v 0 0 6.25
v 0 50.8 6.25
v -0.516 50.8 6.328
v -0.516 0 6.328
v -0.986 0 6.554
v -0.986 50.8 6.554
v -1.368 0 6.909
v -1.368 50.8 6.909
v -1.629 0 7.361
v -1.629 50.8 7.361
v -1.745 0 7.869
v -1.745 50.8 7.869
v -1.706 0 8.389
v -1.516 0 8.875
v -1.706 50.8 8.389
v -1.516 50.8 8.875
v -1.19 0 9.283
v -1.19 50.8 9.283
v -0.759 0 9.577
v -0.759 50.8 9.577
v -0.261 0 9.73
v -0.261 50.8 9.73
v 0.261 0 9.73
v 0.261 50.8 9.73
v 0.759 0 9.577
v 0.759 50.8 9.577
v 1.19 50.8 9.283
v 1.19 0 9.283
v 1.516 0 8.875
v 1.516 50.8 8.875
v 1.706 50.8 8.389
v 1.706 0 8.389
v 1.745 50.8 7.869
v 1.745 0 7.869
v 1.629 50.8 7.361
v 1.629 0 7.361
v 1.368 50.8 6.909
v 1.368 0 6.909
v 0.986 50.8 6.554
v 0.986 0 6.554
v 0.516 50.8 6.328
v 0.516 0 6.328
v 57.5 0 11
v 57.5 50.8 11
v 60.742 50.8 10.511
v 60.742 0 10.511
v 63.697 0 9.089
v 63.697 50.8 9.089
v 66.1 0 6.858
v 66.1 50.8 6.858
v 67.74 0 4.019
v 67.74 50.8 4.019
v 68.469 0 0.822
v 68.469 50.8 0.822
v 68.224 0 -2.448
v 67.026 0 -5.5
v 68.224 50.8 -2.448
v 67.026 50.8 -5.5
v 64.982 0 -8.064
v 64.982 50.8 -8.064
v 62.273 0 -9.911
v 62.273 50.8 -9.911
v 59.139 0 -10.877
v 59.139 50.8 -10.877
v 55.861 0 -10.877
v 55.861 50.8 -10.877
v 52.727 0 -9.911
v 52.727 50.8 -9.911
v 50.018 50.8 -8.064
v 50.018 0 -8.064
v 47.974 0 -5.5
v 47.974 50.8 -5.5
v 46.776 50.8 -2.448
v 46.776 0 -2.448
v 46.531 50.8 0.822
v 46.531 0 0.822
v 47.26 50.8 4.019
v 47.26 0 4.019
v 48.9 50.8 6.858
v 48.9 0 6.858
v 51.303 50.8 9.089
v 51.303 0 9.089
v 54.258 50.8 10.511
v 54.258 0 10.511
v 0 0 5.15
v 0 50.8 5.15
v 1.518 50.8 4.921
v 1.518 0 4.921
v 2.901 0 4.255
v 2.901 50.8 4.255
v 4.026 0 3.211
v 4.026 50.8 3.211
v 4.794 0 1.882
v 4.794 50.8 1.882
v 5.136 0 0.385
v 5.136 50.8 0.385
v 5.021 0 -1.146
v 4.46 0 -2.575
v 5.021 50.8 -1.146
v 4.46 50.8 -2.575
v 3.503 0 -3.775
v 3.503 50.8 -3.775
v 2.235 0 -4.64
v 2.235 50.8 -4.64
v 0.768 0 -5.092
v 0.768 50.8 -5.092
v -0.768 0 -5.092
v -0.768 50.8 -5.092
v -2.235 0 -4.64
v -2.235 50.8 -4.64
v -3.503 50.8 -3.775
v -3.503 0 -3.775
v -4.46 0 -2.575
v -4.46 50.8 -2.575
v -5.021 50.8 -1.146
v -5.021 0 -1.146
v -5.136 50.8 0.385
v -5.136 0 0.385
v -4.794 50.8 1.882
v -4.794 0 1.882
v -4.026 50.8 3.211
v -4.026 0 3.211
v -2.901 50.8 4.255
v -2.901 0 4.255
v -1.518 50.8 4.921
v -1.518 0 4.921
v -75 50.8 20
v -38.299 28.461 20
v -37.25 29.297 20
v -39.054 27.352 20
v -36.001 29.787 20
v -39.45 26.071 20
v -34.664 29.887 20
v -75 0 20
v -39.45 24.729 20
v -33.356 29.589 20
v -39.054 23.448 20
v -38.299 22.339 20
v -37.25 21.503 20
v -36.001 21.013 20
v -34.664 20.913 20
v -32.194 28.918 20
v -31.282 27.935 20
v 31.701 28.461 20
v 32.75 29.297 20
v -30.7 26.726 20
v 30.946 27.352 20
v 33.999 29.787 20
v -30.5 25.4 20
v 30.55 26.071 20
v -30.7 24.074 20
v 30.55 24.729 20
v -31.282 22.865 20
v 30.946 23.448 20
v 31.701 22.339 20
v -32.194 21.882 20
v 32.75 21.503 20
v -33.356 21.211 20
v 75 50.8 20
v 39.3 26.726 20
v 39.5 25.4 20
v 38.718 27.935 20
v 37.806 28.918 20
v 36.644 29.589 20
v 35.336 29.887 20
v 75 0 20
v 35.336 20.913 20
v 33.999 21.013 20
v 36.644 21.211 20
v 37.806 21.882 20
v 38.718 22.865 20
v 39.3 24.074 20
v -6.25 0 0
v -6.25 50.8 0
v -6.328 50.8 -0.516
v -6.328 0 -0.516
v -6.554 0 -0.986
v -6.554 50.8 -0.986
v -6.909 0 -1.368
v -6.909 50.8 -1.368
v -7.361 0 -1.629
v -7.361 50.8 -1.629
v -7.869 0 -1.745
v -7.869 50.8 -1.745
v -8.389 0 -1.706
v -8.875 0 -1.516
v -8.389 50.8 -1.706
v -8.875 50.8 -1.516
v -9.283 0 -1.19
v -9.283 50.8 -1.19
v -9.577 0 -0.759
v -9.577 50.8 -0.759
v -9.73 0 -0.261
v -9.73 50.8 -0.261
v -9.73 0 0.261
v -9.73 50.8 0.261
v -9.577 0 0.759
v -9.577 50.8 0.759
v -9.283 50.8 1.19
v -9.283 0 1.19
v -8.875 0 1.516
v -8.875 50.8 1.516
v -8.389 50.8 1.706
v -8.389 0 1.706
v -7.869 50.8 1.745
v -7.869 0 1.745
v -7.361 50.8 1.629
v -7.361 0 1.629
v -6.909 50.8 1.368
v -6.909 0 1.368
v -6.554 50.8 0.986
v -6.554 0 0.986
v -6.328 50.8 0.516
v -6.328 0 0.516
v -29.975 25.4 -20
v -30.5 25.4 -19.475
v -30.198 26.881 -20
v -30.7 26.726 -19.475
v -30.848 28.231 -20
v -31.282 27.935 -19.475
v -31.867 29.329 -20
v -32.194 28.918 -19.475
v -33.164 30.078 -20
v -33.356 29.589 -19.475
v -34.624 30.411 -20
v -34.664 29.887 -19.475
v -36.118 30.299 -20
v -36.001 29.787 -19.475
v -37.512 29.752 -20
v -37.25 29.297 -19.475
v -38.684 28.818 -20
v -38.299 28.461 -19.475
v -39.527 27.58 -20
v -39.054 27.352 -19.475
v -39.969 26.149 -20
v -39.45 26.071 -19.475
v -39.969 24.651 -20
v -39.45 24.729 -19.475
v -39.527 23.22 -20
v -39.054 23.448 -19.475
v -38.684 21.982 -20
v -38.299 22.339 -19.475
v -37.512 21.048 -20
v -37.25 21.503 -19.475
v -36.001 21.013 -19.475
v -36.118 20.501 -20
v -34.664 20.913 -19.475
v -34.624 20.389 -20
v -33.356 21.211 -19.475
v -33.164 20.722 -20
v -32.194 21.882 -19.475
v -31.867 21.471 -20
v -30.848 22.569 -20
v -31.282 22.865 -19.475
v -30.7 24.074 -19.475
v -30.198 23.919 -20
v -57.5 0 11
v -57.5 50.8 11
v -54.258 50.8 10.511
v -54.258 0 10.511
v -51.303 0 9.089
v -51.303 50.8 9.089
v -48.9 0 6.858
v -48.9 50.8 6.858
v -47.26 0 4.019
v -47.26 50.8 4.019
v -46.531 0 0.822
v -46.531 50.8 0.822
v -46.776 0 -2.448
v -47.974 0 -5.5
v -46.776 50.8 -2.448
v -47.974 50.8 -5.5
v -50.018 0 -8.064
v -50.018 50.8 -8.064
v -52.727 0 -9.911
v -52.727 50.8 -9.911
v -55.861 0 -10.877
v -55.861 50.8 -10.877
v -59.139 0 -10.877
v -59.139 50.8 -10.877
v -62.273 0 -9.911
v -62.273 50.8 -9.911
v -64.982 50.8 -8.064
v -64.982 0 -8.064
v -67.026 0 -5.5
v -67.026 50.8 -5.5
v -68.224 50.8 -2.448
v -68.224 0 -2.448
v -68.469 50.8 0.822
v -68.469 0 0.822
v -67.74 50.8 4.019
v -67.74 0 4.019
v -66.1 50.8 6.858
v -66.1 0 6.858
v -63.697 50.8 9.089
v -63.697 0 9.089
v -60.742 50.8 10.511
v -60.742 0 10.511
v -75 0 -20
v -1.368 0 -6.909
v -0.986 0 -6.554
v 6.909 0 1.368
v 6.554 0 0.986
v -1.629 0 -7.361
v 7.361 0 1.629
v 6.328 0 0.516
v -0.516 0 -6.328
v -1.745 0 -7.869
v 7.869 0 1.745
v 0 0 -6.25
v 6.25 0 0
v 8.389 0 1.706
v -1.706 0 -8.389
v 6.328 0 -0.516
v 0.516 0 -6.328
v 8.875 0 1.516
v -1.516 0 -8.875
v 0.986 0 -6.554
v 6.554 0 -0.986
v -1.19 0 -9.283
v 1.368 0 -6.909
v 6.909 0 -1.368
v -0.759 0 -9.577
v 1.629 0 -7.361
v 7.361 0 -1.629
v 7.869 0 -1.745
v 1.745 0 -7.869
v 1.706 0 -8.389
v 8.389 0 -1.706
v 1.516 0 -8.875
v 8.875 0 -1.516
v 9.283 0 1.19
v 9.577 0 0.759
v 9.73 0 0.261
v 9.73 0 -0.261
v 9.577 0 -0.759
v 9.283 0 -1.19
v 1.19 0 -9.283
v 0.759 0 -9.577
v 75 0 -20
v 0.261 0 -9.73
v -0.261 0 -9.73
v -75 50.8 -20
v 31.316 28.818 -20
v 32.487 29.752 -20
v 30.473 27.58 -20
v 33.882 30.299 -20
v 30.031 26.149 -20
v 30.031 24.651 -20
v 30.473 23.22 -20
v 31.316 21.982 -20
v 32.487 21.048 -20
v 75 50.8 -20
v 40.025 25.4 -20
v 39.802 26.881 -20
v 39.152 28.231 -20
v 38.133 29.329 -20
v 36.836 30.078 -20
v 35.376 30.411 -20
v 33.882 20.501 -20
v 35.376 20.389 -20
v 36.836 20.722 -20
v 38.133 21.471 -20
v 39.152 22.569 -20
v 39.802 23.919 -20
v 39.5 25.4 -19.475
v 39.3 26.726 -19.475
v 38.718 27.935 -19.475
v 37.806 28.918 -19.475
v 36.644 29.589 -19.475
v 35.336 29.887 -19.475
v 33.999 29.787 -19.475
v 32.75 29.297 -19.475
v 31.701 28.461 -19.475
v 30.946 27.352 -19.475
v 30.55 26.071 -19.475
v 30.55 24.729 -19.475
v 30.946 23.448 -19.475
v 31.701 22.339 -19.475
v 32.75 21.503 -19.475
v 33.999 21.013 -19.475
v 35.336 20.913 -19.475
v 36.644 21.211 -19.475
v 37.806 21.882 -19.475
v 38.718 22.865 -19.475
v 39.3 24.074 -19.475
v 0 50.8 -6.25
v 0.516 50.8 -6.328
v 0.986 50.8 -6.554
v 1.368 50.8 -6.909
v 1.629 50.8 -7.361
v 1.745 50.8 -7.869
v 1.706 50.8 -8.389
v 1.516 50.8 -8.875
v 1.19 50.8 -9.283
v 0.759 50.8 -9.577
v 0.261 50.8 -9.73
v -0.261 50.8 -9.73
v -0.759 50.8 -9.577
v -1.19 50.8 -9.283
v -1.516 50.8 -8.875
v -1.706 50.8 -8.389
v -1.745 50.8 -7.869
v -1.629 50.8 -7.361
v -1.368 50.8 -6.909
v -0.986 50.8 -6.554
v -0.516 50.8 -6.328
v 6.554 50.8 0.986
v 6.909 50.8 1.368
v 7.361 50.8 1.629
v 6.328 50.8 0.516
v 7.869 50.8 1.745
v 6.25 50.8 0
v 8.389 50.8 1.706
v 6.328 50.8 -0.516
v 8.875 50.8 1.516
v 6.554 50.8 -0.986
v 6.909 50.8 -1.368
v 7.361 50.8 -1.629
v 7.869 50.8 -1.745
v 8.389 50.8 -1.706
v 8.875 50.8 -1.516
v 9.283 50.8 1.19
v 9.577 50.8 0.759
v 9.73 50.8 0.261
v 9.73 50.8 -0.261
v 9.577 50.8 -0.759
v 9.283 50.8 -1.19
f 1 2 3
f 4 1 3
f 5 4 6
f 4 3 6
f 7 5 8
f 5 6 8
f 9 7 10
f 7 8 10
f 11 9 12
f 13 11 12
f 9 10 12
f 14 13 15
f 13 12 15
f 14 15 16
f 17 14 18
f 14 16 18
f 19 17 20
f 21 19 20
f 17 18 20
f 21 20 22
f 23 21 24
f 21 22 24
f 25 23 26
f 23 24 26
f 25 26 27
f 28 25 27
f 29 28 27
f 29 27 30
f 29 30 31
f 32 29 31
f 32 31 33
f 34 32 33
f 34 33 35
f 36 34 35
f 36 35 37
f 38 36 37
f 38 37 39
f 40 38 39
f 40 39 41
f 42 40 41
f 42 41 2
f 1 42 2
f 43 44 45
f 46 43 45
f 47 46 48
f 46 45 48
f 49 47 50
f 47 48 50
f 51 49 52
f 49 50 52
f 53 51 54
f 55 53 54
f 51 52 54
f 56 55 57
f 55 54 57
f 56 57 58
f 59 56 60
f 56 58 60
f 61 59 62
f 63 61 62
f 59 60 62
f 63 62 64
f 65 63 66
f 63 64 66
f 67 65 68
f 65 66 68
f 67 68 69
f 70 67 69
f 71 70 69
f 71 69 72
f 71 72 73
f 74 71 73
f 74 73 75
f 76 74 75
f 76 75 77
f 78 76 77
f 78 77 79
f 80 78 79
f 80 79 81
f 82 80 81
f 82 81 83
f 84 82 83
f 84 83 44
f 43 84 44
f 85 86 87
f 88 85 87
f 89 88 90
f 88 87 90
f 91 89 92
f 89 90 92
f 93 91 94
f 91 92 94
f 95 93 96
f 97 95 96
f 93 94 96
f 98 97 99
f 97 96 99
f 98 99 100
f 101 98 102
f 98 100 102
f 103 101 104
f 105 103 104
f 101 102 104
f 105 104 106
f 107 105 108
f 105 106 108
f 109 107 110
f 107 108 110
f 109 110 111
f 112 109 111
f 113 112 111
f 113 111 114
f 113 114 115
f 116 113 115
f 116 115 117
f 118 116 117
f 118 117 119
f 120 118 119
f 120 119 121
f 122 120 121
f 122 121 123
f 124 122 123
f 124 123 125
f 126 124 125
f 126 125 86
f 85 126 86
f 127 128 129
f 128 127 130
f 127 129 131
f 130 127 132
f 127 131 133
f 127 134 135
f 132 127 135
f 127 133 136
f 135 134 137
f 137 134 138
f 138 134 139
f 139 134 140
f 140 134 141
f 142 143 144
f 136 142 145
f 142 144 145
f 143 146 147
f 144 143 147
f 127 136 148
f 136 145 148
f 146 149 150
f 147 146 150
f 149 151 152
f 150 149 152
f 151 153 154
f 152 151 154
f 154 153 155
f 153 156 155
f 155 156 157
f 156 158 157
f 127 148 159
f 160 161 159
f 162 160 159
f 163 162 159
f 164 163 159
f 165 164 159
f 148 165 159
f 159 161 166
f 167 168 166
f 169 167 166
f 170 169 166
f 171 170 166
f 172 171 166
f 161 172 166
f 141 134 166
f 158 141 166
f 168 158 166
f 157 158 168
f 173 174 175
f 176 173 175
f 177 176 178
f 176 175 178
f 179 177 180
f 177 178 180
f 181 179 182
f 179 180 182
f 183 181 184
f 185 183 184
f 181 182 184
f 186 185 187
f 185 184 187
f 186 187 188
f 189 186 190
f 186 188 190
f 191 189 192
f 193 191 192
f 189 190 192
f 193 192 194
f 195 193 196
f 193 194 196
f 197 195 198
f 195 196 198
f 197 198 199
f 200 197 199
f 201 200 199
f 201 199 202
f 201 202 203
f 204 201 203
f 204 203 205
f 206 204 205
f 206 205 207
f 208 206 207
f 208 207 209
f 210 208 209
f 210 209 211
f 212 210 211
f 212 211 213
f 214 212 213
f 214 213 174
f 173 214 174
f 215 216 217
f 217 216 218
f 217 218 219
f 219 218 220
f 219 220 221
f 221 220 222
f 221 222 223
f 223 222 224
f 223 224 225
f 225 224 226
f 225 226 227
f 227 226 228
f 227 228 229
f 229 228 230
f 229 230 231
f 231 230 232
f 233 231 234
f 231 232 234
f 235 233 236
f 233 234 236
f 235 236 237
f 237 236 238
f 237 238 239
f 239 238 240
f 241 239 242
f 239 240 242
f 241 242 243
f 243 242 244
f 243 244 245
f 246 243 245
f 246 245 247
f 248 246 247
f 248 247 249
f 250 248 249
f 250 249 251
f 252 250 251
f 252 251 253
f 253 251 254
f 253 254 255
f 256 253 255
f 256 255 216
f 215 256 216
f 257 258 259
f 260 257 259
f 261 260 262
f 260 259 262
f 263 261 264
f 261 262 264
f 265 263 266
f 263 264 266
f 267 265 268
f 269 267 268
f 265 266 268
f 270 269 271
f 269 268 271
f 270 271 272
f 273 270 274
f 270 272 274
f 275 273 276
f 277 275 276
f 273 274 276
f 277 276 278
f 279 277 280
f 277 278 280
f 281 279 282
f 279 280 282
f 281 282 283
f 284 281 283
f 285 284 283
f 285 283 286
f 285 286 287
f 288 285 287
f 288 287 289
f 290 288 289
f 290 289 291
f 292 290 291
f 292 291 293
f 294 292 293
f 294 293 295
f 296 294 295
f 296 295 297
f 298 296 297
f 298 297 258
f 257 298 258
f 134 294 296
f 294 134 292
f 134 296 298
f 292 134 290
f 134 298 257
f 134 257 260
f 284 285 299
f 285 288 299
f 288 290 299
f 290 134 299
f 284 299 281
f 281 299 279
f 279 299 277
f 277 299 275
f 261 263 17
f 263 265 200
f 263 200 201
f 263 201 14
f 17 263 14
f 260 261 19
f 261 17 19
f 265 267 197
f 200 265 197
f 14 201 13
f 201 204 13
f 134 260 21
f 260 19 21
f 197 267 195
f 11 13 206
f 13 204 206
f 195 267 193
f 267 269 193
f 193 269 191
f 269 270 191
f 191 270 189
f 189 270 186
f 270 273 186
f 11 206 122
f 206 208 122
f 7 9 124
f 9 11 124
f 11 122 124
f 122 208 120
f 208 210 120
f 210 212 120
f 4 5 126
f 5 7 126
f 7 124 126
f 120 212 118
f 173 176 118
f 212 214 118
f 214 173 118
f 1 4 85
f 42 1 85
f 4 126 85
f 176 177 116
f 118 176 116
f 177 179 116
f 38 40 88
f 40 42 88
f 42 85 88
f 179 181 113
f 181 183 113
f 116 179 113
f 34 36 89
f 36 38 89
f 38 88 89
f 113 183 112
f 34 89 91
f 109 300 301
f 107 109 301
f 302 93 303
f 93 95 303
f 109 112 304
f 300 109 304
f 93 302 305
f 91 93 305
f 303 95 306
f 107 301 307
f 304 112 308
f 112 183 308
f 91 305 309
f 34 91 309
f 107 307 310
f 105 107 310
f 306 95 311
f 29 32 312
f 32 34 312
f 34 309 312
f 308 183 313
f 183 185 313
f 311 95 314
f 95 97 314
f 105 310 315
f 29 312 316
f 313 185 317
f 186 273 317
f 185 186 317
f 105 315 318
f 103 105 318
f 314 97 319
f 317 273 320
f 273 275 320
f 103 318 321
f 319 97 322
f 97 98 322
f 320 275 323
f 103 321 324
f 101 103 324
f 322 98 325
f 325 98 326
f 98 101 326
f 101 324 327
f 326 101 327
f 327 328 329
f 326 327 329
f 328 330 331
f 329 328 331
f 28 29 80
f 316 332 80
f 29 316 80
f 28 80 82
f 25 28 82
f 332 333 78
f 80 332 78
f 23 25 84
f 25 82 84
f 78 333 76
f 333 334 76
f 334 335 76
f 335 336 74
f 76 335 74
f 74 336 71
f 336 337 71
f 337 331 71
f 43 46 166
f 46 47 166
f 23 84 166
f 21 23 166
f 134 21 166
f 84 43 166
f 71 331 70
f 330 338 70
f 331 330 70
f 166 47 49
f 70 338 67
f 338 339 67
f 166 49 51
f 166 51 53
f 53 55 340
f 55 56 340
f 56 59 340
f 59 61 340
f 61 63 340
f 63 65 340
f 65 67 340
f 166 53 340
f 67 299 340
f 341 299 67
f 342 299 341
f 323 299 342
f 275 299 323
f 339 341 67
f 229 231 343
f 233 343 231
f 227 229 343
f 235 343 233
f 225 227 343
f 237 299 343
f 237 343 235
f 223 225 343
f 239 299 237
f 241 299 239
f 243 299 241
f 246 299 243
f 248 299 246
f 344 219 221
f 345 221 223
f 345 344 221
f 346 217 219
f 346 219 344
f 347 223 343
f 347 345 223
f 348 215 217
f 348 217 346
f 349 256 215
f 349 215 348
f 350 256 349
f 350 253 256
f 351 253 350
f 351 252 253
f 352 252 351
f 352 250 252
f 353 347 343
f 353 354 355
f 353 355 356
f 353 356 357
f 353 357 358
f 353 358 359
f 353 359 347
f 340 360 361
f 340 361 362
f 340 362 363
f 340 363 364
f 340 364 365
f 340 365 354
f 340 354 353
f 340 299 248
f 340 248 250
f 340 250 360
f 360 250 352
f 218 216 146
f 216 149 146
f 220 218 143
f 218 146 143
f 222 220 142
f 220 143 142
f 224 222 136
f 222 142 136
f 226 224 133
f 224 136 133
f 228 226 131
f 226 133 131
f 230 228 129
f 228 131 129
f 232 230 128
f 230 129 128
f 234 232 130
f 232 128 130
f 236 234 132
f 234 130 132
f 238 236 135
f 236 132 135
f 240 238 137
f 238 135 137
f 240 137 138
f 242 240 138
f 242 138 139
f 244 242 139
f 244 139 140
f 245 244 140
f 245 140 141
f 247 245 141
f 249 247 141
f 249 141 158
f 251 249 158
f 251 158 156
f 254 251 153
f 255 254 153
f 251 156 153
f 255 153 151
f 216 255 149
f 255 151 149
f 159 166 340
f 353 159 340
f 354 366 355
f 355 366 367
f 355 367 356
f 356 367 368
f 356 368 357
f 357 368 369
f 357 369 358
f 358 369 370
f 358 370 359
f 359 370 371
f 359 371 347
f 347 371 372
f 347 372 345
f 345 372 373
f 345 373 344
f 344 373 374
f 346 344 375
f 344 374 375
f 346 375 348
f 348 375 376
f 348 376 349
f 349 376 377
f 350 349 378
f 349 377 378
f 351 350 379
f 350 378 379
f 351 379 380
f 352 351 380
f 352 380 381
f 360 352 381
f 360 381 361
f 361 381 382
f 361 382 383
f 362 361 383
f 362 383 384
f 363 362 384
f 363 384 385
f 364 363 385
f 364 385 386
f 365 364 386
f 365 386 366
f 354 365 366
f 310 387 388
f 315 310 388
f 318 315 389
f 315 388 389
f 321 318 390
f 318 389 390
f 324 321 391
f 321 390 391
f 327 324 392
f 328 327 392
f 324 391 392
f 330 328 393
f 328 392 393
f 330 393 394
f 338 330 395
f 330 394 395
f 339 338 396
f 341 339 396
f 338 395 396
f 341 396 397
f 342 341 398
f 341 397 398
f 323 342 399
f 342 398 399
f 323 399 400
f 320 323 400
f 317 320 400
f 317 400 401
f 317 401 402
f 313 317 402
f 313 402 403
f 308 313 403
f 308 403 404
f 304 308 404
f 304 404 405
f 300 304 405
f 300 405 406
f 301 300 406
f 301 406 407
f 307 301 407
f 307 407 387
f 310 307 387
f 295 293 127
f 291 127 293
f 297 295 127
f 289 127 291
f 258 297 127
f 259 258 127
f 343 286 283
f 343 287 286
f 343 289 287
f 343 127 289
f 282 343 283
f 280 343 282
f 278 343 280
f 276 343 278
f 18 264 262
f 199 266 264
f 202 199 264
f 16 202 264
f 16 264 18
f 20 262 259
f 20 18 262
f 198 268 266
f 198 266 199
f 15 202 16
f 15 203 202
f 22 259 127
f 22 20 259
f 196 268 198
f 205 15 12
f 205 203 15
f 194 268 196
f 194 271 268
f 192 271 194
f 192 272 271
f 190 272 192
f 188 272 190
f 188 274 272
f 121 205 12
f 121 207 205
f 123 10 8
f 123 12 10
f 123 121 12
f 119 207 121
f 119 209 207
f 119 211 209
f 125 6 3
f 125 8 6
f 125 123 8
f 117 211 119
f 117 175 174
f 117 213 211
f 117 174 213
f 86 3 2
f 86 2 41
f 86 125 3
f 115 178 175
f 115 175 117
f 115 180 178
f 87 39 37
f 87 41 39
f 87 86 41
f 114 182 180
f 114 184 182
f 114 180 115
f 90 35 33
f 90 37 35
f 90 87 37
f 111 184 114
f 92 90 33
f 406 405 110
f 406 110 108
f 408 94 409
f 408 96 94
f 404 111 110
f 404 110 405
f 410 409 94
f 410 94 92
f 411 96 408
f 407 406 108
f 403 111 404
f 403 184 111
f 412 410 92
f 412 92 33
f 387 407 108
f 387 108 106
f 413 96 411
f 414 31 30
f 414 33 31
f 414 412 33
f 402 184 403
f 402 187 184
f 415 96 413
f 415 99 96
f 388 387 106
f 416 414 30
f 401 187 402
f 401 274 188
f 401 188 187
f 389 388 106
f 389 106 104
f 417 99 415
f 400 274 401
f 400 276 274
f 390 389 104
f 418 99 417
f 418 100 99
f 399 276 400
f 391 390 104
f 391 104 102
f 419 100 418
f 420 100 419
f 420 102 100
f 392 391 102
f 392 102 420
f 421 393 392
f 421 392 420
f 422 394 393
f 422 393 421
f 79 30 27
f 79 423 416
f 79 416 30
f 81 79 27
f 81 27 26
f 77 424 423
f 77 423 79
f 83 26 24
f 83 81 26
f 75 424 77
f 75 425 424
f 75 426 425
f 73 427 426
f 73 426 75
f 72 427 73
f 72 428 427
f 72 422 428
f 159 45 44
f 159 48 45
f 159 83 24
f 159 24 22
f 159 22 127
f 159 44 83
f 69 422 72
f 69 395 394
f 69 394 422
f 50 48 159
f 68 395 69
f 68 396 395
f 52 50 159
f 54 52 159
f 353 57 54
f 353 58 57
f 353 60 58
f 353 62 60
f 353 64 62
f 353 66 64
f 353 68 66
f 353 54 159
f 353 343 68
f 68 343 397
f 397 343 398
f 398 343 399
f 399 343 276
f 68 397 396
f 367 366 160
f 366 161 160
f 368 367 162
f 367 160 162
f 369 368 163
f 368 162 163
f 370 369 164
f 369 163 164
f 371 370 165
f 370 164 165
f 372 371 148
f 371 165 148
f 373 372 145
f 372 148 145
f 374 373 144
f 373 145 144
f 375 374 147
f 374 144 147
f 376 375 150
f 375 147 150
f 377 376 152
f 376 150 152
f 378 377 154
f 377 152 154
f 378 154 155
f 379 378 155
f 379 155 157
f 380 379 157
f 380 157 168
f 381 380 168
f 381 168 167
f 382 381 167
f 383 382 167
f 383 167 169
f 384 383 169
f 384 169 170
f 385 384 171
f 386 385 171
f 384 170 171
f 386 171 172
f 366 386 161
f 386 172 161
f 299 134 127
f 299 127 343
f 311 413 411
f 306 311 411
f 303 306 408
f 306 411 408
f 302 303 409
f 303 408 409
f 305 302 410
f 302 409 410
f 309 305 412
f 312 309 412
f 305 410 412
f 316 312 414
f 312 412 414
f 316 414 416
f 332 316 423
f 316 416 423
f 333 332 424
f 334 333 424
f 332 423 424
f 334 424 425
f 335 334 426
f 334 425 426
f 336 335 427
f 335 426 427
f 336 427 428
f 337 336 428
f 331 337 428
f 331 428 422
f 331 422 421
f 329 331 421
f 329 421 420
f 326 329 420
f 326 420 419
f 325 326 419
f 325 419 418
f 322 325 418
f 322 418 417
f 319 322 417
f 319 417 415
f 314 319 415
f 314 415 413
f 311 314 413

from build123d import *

# Parameters (mm, degrees)
ESBO_O1_W                            = 150
ESBO_O1_H                            = 40
RESSALTO_EXTRUS_O1_DEPTH             = 50.8
ESBO_O2_R                            = 5.15
ESBO_O2_R_2                          = 11
CORTE_EXTRUS_O1_DEPTH                = 93.766588813
ESBO_O3_R                            = 1.75
CORTE_EXTRUS_O2_DEPTH                = 93.766588813
PADR_OCIRCULAR1_COUNT                = 4
ESBO_O5_R                            = 4
CORTE_EXTRUS_O3_DEPTH                = 100.023431571
FURO_ROSCADO_DE_M10X1_01_D           = 9
FURO_ROSCADO_DE_M10X1_01_CSINK_D     = 10.05
FURO_ROSCADO_DE_M10X1_01_CSINK_ANGLE = 90


with BuildPart() as part:
    # Esboço1 → Ressalto-extrusão1 (new body)
    with BuildSketch(Plane(origin=(0, 0, 0), x_dir=(1, 0, 0), z_dir=(0, 1, 0))):
        Rectangle(ESBO_O1_W, ESBO_O1_H)
    extrude(amount=RESSALTO_EXTRUS_O1_DEPTH)

    # Esboço2 → Corte-extrusão1 (cut, through all)
    with BuildSketch(Plane(origin=(0, 50.8, 0), x_dir=(1, 0, 0), z_dir=(0, 1, 0))):
        with Locations(Location((0, 0, 0), (0, 0, 270))):
            Circle(ESBO_O2_R)
        with Locations(Location((-57.5, 0, 0), (0, 0, 270))):
            Circle(ESBO_O2_R_2)
        with Locations(Location((57.5, 0, 0), (0, 0, 270))):
            Circle(ESBO_O2_R_2)
    extrude(amount=-CORTE_EXTRUS_O1_DEPTH, mode=Mode.SUBTRACT)

    # Esboço3 → Corte-extrusão2 (cut, through all)
    with BuildSketch(Plane(origin=(0, 50.8, 0), x_dir=(1, 0, 0), z_dir=(0, 1, 0))):
        with Locations(Location((0, 8, 0), (0, 0, 270))):
            Circle(ESBO_O3_R)
    corte_extrus_o2 = extrude(amount=-CORTE_EXTRUS_O2_DEPTH, mode=Mode.SUBTRACT)

    # PadrãoCircular1: Corte-extrusão2 ×4 about axis
    padr_ocircular1_axis = Axis((0, 0, 0), (0, 1, 0))
    for i in range(1, PADR_OCIRCULAR1_COUNT):
        add(corte_extrus_o2.rotate(padr_ocircular1_axis, i * 360 / PADR_OCIRCULAR1_COUNT), mode=Mode.SUBTRACT)

    # Esboço5 → Corte-extrusão3 (cut, through all)
    with BuildSketch(Plane(origin=(0, 0, -20), x_dir=(-1, 0, 0), z_dir=(0, 0, -1))):
        with Locations((35, 25.4)):
            Circle(ESBO_O5_R)
        with Locations((-35, 25.4)):
            Circle(ESBO_O5_R)
    extrude(amount=-CORTE_EXTRUS_O3_DEPTH, mode=Mode.SUBTRACT)

    # Furo roscado de M10x1.01 (through all)
    with Locations(Plane(origin=(0, 0, -20), x_dir=(-1, 0, 0), z_dir=(0, 0, -1))):
        with Locations((35, 25.4), (-35, 25.4)):
            CounterSinkHole(FURO_ROSCADO_DE_M10X1_01_D / 2, FURO_ROSCADO_DE_M10X1_01_CSINK_D / 2, counter_sink_angle=FURO_ROSCADO_DE_M10X1_01_CSINK_ANGLE)


solid = part.part
